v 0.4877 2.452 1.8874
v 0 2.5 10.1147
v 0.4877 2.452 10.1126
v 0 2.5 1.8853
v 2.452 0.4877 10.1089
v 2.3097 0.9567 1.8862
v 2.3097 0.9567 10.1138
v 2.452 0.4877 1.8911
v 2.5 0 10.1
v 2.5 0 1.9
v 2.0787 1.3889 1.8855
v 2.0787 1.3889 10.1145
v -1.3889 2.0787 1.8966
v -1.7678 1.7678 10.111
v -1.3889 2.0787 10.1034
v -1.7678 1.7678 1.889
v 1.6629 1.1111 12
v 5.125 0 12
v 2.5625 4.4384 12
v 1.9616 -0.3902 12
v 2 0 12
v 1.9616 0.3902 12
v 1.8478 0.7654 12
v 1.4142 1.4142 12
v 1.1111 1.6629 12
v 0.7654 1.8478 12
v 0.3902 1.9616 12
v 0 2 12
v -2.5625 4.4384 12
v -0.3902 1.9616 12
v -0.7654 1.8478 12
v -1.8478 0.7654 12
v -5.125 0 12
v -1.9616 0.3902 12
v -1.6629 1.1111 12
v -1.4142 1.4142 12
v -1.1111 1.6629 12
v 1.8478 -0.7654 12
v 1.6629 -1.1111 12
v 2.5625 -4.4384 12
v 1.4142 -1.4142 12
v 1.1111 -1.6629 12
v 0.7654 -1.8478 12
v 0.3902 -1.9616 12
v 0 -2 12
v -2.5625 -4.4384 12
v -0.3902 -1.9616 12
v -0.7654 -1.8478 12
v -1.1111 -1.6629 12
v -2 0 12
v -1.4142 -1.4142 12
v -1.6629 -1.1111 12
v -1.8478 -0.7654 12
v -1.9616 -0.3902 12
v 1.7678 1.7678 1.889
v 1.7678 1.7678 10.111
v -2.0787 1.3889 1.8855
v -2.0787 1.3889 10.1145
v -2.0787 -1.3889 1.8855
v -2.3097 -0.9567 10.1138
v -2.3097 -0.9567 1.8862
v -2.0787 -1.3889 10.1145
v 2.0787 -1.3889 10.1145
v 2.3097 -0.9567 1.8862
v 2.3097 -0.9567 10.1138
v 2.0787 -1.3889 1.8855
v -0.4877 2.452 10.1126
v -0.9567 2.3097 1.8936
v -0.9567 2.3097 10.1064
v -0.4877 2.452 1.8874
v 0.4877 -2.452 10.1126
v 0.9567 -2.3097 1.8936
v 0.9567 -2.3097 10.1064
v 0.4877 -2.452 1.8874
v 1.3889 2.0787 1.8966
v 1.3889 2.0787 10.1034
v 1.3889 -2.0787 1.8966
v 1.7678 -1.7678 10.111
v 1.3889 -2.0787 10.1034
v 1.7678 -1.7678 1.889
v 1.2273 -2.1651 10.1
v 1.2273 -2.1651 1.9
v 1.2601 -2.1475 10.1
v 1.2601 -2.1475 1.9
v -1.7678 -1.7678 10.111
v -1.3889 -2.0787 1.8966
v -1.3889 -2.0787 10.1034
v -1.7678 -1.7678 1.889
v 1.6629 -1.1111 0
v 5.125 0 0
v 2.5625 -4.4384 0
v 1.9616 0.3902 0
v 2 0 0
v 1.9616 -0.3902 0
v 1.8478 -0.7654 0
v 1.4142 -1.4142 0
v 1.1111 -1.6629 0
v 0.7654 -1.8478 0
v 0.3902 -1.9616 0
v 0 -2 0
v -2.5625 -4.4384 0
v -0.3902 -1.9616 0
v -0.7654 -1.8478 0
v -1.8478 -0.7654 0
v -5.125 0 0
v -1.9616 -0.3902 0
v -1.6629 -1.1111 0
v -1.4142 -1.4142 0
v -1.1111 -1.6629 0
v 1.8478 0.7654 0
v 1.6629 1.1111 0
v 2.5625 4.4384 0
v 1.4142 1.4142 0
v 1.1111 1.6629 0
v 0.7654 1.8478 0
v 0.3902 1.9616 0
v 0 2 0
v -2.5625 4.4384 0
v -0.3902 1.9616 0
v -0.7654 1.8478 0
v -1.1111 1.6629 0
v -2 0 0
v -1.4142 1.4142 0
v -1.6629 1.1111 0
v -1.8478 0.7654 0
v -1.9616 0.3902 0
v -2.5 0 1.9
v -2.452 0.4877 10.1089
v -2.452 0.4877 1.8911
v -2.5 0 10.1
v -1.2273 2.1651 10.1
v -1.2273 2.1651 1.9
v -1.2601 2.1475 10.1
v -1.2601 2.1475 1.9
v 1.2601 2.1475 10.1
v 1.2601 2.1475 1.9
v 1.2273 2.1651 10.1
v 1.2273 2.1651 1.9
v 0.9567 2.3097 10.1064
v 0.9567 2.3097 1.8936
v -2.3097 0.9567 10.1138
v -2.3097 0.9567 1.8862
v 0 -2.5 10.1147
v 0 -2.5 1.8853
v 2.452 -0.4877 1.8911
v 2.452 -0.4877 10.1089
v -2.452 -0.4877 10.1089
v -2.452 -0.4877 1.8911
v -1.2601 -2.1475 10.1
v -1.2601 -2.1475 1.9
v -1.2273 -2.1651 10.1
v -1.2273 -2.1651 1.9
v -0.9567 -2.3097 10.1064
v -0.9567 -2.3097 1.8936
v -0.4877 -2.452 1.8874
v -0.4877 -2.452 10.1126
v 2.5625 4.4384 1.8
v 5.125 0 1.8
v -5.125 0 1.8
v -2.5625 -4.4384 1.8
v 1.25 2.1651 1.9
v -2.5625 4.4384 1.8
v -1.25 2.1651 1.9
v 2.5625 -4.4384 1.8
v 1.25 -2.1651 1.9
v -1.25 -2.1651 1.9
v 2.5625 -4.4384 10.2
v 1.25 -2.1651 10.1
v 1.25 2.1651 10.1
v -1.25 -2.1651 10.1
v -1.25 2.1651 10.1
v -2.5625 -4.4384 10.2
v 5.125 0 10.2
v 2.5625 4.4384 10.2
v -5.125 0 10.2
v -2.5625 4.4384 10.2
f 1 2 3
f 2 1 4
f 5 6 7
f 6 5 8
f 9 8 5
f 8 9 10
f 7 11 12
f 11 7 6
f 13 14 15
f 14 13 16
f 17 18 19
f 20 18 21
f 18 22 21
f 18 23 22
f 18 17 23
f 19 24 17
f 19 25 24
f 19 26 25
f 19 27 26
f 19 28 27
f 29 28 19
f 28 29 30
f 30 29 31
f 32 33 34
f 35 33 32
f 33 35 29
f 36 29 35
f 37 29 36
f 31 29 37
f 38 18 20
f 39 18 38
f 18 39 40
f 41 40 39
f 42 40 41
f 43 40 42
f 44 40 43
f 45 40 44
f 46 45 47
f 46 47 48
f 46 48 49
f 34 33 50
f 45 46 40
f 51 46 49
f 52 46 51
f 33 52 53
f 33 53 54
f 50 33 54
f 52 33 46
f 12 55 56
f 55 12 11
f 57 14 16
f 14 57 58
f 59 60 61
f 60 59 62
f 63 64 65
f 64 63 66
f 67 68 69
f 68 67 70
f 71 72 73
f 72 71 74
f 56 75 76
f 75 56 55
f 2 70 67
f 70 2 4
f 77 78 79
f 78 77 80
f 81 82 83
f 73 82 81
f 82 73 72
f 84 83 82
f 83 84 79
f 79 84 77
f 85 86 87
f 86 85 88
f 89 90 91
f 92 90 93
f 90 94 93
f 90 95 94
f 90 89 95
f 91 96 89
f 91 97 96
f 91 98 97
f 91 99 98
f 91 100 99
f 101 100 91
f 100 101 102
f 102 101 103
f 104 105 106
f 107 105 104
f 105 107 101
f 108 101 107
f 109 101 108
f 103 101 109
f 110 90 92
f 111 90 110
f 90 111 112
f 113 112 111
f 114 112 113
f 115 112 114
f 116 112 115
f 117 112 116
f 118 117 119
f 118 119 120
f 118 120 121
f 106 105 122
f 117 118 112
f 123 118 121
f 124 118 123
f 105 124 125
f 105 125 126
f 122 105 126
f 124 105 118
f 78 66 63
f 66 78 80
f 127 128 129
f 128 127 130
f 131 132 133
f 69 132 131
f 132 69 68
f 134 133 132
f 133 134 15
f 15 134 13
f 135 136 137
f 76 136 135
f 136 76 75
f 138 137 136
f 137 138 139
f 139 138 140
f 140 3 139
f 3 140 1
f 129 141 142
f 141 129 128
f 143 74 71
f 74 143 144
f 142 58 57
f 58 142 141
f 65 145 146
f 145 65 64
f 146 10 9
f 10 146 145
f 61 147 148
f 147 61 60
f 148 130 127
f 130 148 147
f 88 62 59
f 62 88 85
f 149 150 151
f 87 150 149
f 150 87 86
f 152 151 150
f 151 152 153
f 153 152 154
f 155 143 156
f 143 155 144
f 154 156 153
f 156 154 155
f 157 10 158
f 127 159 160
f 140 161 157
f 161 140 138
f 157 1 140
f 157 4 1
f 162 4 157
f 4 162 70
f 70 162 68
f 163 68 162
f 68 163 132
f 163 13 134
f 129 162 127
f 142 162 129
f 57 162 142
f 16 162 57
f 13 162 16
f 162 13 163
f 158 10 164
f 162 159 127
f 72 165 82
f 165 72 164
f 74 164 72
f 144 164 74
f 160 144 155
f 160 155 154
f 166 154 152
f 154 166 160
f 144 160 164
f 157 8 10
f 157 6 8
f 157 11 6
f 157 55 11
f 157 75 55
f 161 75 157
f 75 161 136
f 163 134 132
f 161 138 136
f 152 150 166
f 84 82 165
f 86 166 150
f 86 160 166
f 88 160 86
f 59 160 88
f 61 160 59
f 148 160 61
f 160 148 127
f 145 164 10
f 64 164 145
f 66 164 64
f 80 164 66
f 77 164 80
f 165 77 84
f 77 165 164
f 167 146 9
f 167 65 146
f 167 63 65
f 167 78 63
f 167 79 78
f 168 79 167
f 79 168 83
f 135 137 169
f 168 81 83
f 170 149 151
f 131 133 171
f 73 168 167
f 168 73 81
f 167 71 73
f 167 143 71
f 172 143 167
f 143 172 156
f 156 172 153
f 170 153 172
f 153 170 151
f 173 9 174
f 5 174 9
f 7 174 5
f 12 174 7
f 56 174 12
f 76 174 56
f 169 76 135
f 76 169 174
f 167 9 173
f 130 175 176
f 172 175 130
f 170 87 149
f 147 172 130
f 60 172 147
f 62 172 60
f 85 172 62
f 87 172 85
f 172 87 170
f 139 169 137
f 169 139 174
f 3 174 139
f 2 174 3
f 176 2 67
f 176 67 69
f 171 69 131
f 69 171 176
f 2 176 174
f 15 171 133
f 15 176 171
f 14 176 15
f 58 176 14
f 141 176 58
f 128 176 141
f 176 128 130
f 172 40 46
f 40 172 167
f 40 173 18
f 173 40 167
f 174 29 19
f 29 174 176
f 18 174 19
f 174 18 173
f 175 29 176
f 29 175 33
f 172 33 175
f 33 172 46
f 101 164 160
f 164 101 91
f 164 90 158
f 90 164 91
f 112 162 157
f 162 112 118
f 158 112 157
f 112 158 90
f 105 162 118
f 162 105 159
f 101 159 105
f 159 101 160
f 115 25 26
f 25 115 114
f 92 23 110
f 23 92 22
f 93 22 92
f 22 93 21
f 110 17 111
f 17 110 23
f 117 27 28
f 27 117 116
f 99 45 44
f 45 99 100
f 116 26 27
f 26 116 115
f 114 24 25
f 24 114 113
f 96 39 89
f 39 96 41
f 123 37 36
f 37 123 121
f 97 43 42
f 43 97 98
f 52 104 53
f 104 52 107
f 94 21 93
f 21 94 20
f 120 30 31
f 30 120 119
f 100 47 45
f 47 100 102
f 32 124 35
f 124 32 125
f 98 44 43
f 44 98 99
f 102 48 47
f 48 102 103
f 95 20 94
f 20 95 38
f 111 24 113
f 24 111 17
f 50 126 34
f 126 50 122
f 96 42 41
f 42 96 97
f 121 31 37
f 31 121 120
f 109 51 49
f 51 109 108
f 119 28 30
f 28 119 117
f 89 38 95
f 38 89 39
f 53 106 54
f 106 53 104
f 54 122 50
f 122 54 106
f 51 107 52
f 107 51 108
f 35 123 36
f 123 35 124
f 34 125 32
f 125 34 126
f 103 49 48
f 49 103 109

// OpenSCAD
// file: parameter.scad
nStrings=6;
nFrets=24;
nLedFrets=16;
m5Dia=5.3;
m5HeadZ=3.5;
m4Dia=4.3;
m4NutDia=8.3;
m4NutZ=3.5;
m4HeadZ=2.5;
m3Dia=3.3;
m3NutDia=6.6;
m3NutZ=2.5;
m3HeadZ=2;
strDistN=7;
strDistB=10.25;
scale=645;
neckSlotY=500;

slotXY=15;

bodySlotX=115;
bodySlotY=250;

jackYA=40;
jackYB=54;
jackZA=20;
jackZB=25;

bodyX=300;

bodyZ=40;

strDia=[1.7,1.4,1.1,0.7,0.5,0.35];

fretStrPlus=4;
fretLN=strDistN*(nStrings-1)+fretStrPlus*2;
fretLB=strDistB*(nStrings-1)+fretStrPlus*2;
strSpanB=strDistB*(nStrings-1);
strSpanN=strDistN*(nStrings-1);
fretBtmZ=1;
neckSlotX=fretLN;
neckSlotDist=neckSlotX-slotXY*2;

neck_sideT=5.5; //thicknes of the neck side locks
neck_bottomT=2.5;

neck_mntPosYA=447;
neck_mntPosYB=420;
neck_mntEndT=2.5;
neck_lastFretSpc=13;

nut_slotSink=6;

//fretY=16;
fretPcbZ=1.6;
fretDia=3.5;
fretZ=1.5;
fretOvrZ=4;
fretboardZ=fretOvrZ+fretPcbZ;



L=scale;
k=1.05946;

fretPos1=scale-(scale/pow(k,4));

function fretPos(i)=L-(L/pow(k,i));
function fretSpc(i)=(L/pow(k,i))-(L/pow(k,i+1));
function strSpc(i)=i/L*strDistB+(1-i/L)*strDistN;
function fretL(i)=(i/L*strDistB+(1-i/L)*strDistN)*(nStrings-1)+fretStrPlus*2;

echo (70-(fretL(fretPos(1))));
// main file
include <parameter.scad>
pickup();

!rotate([0,0,0])coil();


module pickup(){
strings=6;
spacing=strSpanB;
echo (spacing);
diameter=10.5;
wall=2;
coilZ=12;
bottomZ=2;
t=0.3;
ySpacing=11;

bX = spacing+diameter+wall*4;
bY=ySpacing+diameter+wall*1;
bZ=coilZ+bottomZ+t;

tX = bX;
tY=bY;
hub=2.5;
magZ=1.5;
magDia=3.2;
tbottomZ=2;
tZ=hub+magZ+tbottomZ;
tDia=6.7;//6.5;
screwTdia=3.3;

screwMdia=4.3;
screwAdia=2.25;


module base(){
$fn=16;
difference(){
translate([0,0,0])rcube([bX,bY,bZ],3);

translate([-spacing/2,0,0]){
for(x=[0:strings-1]){
translate([x*(spacing/(strings-1)),ySpacing/2,0]){
translate([0,0,bottomZ])rotate([0,0,30])cylinder(d=diameter,h=100,$fn=6);
translate([0,0,-1])cylinder(d=magDia,h=100,$fn=16);
rotate([0,0,30])translate([0,-diameter/2+0.5,0])cylinder(d=screwAdia,h=100);
}}

for(x=[0:strings-1]){
translate([x*(spacing/(strings-1)),-ySpacing/2,0]){
translate([0,0,bottomZ])rotate([0,0,30])cylinder(d=diameter,h=100,$fn=6);
translate([0,0,-1])cylinder(d=magDia,h=100,$fn=16);
rotate([0,0,30])translate([0,diameter/2-0.5,0])cylinder(d=screwAdia,h=100);
}}

}
translate([-bX/2+screwMdia*0.8,0,0])cylinder(d=screwMdia-t,h=bZ);
translate([bX/2-screwMdia*0.8,0,0])cylinder(d=screwMdia-t,h=bZ);
}

}

//for(x=[0:strings-1]){
//translate([-spacing/2+x*(spacing/(strings-1)),-ySpacing/2,bottomZ]){
//rotate([0,0,0])coil();
//}}
base();
}

module coil(){
$fn=32;
magholedia=4;
wallthick=0.5;
loweridlerZ=1.8;
upperidlerZ=1.8;
rampBZ=0.1;
rampTZ=0.1;
coildia=10.25;
rampdia=coildia;
threaddepth=5;
roofZ=0;//loweridlerZ;
coilZ=12;
idlRes=6;

difference(){
union(){
cylinder(d=magholedia+wallthick*2,h=coilZ);
translate([0,0,loweridlerZ])cylinder(d1=rampdia,d2=magholedia+wallthick*2,h=rampBZ,$fn=idlRes);
translate([0,0,coilZ-upperidlerZ-rampTZ])cylinder(d2=rampdia/100*100,d1=magholedia+wallthick*2,h=rampTZ,$fn=idlRes);
translate([0,0,coilZ-upperidlerZ])cylinder(d=coildia/100*100,h=upperidlerZ,,$fn=idlRes);
//Ccube([coildia,coildia,upperidlerZ],[0,0,1]);
translate([0,0,0]){
//Ccube([coildia,coildia,loweridlerZ],[0,0,1]);
cylinder(d=coildia,h=loweridlerZ,$fn=idlRes);

}
}

translate([0,0,-roofZ])cylinder(d=magholedia,h=coilZ);
//cylinder(d=coilthreaddia,h=coilZ+1);
}}

module rcube(size,radius){
linear_extrude(height=size[2])
if(radius>0){
hull()
{
    // place 4 circles in the corners, with the given radius
    translate([(-size[0]/2)+(radius), (-size[1]/2)+(radius), 0])
    circle(r=radius);

    translate([(size[0]/2)-(radius), (-size[1]/2)+(radius), 0])
    circle(r=radius);

    translate([(-size[0]/2)+(radius), (size[1]/2)-(radius), 0])
    circle(r=radius);

    translate([(size[0]/2)-(radius), (size[1]/2)-(radius), 0])
    circle(r=radius);
}
}
if(radius==0){
translate([0,0,size[2]/2])cube(size,center=true);
}
}
